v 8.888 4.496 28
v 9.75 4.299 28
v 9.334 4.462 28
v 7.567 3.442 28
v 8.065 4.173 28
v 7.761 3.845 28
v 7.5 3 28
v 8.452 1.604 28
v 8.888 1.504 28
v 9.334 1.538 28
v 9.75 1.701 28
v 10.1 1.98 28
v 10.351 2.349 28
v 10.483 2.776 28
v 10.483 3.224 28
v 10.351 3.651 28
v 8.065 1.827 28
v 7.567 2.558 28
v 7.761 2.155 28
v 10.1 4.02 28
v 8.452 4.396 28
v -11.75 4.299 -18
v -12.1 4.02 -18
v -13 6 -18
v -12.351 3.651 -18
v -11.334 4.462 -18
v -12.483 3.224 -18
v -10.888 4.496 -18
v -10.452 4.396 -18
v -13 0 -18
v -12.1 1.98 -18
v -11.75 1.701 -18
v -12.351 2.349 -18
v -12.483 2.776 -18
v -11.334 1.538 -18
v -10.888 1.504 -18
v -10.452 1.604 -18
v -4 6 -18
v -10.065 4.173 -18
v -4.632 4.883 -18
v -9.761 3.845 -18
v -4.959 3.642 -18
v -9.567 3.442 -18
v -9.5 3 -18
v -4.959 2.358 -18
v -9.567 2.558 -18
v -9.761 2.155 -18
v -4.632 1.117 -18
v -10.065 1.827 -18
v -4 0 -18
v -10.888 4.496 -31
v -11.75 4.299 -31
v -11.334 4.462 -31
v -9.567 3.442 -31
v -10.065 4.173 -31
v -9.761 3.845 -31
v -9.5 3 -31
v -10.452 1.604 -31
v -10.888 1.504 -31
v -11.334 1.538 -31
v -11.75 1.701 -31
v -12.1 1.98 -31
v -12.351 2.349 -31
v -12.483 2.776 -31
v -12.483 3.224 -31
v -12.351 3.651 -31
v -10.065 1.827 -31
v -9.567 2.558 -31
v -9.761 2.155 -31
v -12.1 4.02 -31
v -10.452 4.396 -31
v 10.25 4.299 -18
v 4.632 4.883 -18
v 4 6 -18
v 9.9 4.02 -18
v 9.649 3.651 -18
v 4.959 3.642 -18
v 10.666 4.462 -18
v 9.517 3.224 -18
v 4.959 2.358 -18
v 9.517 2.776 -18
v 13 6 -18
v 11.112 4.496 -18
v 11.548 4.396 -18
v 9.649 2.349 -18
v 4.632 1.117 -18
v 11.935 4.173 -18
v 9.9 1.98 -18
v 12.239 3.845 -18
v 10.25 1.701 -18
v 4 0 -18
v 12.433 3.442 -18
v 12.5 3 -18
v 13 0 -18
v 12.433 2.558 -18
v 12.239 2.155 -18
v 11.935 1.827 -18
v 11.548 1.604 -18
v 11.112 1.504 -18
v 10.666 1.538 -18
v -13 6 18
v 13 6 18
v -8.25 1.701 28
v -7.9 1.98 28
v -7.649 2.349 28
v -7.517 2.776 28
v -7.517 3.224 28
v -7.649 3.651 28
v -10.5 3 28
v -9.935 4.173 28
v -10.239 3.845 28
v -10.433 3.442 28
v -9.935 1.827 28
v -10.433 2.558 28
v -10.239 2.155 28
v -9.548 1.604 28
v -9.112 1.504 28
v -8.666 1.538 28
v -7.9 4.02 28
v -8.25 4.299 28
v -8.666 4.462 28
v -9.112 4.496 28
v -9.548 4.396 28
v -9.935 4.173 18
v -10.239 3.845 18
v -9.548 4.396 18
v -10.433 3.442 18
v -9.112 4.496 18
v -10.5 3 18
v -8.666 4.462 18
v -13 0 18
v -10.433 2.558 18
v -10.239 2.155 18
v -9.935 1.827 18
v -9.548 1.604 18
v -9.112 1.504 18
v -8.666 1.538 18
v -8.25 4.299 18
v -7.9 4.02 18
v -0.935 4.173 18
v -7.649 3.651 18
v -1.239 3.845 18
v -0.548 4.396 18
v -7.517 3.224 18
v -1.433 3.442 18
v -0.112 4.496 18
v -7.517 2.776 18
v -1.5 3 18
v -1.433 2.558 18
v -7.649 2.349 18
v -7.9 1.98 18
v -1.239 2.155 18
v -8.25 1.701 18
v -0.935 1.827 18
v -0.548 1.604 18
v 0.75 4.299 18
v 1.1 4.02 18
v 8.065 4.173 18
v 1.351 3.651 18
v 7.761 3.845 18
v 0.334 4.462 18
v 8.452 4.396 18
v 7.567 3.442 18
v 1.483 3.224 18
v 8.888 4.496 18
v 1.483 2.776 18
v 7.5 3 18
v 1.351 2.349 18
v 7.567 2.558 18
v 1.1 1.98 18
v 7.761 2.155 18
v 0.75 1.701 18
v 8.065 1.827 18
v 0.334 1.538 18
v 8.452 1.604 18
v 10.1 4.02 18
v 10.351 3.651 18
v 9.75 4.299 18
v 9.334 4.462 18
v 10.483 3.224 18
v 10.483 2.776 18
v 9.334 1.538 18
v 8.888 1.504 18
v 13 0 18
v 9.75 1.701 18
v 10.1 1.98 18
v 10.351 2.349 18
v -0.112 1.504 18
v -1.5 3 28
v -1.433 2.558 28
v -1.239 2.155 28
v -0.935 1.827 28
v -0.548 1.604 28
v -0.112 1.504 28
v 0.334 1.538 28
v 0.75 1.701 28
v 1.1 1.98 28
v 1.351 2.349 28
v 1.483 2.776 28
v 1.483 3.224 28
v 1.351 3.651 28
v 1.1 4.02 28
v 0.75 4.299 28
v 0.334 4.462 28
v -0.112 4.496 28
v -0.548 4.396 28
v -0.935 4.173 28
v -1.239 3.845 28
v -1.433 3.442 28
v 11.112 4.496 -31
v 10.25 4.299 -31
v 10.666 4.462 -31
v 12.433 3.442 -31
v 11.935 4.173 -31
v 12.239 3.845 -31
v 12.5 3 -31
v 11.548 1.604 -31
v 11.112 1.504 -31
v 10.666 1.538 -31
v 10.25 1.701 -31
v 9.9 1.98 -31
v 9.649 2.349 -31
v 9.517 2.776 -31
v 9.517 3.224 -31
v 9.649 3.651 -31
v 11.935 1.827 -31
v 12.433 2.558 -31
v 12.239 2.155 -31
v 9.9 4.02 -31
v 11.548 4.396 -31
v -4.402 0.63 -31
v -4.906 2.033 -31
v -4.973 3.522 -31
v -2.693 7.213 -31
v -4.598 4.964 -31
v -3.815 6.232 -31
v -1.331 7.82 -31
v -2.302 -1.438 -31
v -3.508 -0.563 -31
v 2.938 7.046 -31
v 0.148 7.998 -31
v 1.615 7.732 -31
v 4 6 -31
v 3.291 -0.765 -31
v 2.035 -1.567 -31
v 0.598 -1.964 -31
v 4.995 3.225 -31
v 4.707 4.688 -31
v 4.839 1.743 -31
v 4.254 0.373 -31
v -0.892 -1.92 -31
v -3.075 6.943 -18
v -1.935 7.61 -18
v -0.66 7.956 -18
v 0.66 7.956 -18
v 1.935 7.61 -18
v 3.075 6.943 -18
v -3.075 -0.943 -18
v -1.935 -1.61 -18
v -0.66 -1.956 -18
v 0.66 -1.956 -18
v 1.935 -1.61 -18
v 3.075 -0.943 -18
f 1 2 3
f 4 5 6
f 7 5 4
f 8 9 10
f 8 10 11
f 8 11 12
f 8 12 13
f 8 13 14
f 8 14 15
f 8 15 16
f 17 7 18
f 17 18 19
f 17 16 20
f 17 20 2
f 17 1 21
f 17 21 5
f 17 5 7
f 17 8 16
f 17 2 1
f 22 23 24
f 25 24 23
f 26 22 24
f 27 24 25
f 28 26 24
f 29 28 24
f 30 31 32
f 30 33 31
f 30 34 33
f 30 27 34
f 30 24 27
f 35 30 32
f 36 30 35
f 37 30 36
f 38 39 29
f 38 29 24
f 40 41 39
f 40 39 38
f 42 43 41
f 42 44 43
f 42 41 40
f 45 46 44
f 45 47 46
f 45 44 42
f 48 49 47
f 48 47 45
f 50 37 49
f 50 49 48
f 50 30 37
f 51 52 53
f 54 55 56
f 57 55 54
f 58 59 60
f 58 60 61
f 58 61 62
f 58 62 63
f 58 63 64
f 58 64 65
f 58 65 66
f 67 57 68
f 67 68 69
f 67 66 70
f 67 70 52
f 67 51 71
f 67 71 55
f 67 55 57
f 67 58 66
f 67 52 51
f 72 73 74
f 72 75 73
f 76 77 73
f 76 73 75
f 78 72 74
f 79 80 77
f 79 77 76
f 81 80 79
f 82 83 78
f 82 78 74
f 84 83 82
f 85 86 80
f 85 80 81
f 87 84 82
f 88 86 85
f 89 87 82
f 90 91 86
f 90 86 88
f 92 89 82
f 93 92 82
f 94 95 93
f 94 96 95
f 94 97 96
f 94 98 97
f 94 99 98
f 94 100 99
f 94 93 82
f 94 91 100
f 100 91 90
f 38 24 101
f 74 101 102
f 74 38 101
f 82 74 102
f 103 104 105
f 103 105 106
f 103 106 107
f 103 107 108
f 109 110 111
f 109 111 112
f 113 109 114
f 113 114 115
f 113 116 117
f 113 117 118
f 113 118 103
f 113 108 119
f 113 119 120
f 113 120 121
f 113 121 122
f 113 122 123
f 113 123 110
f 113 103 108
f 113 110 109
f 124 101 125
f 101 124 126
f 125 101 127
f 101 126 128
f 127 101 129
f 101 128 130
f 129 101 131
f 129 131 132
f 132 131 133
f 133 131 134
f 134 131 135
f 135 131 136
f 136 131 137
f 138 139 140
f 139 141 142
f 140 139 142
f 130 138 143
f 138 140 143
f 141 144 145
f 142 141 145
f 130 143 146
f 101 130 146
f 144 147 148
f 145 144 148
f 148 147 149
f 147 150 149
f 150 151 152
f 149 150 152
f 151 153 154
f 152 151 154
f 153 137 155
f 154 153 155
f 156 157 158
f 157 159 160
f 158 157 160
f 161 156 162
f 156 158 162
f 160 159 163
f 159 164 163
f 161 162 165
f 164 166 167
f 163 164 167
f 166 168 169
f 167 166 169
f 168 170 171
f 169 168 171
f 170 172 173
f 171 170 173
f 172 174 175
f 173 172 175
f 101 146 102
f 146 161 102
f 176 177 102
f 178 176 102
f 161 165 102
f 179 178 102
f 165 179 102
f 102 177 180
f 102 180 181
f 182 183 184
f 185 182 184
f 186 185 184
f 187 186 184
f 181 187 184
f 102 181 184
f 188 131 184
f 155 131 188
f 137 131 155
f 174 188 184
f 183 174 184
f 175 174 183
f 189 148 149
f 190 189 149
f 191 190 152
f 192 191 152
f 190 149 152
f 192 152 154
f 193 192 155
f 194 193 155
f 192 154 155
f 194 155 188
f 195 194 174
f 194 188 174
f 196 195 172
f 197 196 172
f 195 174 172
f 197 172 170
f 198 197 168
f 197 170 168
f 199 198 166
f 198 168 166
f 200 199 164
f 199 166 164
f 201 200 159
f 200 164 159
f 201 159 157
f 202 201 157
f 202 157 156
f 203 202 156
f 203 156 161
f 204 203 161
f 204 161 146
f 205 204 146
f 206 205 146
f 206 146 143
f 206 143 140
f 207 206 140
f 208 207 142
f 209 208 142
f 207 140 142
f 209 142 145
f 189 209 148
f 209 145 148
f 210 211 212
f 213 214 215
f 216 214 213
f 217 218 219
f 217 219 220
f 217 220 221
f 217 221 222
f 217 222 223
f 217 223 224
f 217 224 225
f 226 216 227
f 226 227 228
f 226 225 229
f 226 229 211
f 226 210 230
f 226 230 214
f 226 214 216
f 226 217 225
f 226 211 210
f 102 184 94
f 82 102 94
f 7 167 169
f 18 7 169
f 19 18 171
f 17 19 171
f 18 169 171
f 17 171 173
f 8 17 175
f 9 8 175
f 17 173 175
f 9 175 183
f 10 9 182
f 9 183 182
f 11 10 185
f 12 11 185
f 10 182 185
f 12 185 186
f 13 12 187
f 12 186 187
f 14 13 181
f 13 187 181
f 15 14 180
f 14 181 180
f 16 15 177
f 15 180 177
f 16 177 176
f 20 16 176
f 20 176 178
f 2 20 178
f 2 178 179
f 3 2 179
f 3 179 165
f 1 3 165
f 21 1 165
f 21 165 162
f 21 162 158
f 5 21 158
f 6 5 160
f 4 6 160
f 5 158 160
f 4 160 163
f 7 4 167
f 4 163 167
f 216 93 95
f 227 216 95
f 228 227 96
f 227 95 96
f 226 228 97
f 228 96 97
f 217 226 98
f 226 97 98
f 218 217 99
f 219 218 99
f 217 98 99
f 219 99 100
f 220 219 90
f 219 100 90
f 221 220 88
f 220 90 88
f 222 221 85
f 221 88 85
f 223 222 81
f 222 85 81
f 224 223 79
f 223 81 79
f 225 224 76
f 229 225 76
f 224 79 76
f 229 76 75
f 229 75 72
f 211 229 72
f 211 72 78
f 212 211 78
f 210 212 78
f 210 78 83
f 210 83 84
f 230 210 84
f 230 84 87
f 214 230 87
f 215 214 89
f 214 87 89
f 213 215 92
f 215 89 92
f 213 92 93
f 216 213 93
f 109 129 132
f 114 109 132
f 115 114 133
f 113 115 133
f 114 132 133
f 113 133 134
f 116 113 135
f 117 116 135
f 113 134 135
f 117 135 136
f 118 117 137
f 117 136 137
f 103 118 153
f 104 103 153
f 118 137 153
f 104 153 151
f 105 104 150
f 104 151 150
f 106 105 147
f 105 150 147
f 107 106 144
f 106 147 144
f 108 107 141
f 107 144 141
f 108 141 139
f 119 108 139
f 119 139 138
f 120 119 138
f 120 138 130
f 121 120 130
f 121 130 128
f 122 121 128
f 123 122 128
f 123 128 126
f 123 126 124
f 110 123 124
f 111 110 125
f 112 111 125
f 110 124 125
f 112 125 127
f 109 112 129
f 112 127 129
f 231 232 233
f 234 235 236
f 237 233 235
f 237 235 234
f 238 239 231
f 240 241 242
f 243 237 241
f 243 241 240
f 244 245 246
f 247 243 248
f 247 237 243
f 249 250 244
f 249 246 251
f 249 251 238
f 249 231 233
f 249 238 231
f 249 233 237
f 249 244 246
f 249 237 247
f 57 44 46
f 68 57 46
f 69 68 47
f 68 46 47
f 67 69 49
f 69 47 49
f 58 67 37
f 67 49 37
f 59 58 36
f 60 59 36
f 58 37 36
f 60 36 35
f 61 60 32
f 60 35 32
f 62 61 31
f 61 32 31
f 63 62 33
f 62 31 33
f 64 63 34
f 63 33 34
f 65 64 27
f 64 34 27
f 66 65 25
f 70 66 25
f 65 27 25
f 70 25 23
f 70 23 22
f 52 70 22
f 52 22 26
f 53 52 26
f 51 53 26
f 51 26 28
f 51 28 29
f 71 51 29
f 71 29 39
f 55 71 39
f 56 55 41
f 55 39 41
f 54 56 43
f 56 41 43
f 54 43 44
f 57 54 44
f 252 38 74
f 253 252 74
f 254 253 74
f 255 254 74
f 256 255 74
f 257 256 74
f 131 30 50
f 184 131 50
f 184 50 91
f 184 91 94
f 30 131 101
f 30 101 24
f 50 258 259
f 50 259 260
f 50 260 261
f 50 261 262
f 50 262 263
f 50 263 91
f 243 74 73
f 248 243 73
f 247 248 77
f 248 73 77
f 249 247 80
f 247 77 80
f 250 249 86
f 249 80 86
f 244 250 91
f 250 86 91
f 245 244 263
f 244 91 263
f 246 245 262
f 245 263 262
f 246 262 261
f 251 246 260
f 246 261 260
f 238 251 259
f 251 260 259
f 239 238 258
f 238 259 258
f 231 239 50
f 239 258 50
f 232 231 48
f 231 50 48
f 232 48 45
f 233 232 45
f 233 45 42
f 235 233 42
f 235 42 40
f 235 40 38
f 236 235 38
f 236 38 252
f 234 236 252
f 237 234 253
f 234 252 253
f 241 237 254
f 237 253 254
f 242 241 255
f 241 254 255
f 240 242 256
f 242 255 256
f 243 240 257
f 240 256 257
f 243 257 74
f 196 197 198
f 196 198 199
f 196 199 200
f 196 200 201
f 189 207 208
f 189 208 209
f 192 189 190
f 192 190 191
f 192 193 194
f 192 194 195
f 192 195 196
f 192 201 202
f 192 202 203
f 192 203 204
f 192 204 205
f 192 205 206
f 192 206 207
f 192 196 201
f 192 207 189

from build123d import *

# Parameters (mm, degrees)
SKETCH1_W           = 26
SKETCH1_H           = 36
BOSS_EXTRUDE1_DEPTH = 6
SKETCH2_R           = 1.5
BOSS_EXTRUDE2_DEPTH = 10
SKETCH3_R           = 5
SKETCH3_R_2         = 1.5
BOSS_EXTRUDE3_DEPTH = 13


with BuildPart() as part:
    # Sketch1 → Boss-Extrude1 (new body)
    with BuildSketch(Plane(origin=(0, 0, 0), x_dir=(1, 0, 0), z_dir=(0, 1, 0))):
        Rectangle(SKETCH1_W, SKETCH1_H)
    extrude(amount=BOSS_EXTRUDE1_DEPTH)

    # Sketch2 → Boss-Extrude2 (add)
    with BuildSketch(Plane.XY.offset(18)):
        with Locations(Location((0, 3, 0), (0, 0, 180))):
            Circle(SKETCH2_R)
        with Locations(Location((-9, 3, 0), (0, 0, 180))):
            Circle(SKETCH2_R)
        with Locations(Location((9, 3, 0), (0, 0, 180))):
            Circle(SKETCH2_R)
    extrude(amount=BOSS_EXTRUDE2_DEPTH)

    # Sketch3 → Boss-Extrude3 (add)
    with BuildSketch(Plane(origin=(0, 0, -18), x_dir=(-1, 0, 0), z_dir=(0, 0, -1))):
        with Locations(Location((0, 3, 0), (0, 0, 143.130102354))):
            Circle(SKETCH3_R)
        with Locations(Location((-11, 3, 0), (0, 0, 180))):
            Circle(SKETCH3_R_2)
        with Locations(Location((11, 3, 0), (0, 0, 180))):
            Circle(SKETCH3_R_2)
    extrude(amount=BOSS_EXTRUDE3_DEPTH)


solid = part.part
